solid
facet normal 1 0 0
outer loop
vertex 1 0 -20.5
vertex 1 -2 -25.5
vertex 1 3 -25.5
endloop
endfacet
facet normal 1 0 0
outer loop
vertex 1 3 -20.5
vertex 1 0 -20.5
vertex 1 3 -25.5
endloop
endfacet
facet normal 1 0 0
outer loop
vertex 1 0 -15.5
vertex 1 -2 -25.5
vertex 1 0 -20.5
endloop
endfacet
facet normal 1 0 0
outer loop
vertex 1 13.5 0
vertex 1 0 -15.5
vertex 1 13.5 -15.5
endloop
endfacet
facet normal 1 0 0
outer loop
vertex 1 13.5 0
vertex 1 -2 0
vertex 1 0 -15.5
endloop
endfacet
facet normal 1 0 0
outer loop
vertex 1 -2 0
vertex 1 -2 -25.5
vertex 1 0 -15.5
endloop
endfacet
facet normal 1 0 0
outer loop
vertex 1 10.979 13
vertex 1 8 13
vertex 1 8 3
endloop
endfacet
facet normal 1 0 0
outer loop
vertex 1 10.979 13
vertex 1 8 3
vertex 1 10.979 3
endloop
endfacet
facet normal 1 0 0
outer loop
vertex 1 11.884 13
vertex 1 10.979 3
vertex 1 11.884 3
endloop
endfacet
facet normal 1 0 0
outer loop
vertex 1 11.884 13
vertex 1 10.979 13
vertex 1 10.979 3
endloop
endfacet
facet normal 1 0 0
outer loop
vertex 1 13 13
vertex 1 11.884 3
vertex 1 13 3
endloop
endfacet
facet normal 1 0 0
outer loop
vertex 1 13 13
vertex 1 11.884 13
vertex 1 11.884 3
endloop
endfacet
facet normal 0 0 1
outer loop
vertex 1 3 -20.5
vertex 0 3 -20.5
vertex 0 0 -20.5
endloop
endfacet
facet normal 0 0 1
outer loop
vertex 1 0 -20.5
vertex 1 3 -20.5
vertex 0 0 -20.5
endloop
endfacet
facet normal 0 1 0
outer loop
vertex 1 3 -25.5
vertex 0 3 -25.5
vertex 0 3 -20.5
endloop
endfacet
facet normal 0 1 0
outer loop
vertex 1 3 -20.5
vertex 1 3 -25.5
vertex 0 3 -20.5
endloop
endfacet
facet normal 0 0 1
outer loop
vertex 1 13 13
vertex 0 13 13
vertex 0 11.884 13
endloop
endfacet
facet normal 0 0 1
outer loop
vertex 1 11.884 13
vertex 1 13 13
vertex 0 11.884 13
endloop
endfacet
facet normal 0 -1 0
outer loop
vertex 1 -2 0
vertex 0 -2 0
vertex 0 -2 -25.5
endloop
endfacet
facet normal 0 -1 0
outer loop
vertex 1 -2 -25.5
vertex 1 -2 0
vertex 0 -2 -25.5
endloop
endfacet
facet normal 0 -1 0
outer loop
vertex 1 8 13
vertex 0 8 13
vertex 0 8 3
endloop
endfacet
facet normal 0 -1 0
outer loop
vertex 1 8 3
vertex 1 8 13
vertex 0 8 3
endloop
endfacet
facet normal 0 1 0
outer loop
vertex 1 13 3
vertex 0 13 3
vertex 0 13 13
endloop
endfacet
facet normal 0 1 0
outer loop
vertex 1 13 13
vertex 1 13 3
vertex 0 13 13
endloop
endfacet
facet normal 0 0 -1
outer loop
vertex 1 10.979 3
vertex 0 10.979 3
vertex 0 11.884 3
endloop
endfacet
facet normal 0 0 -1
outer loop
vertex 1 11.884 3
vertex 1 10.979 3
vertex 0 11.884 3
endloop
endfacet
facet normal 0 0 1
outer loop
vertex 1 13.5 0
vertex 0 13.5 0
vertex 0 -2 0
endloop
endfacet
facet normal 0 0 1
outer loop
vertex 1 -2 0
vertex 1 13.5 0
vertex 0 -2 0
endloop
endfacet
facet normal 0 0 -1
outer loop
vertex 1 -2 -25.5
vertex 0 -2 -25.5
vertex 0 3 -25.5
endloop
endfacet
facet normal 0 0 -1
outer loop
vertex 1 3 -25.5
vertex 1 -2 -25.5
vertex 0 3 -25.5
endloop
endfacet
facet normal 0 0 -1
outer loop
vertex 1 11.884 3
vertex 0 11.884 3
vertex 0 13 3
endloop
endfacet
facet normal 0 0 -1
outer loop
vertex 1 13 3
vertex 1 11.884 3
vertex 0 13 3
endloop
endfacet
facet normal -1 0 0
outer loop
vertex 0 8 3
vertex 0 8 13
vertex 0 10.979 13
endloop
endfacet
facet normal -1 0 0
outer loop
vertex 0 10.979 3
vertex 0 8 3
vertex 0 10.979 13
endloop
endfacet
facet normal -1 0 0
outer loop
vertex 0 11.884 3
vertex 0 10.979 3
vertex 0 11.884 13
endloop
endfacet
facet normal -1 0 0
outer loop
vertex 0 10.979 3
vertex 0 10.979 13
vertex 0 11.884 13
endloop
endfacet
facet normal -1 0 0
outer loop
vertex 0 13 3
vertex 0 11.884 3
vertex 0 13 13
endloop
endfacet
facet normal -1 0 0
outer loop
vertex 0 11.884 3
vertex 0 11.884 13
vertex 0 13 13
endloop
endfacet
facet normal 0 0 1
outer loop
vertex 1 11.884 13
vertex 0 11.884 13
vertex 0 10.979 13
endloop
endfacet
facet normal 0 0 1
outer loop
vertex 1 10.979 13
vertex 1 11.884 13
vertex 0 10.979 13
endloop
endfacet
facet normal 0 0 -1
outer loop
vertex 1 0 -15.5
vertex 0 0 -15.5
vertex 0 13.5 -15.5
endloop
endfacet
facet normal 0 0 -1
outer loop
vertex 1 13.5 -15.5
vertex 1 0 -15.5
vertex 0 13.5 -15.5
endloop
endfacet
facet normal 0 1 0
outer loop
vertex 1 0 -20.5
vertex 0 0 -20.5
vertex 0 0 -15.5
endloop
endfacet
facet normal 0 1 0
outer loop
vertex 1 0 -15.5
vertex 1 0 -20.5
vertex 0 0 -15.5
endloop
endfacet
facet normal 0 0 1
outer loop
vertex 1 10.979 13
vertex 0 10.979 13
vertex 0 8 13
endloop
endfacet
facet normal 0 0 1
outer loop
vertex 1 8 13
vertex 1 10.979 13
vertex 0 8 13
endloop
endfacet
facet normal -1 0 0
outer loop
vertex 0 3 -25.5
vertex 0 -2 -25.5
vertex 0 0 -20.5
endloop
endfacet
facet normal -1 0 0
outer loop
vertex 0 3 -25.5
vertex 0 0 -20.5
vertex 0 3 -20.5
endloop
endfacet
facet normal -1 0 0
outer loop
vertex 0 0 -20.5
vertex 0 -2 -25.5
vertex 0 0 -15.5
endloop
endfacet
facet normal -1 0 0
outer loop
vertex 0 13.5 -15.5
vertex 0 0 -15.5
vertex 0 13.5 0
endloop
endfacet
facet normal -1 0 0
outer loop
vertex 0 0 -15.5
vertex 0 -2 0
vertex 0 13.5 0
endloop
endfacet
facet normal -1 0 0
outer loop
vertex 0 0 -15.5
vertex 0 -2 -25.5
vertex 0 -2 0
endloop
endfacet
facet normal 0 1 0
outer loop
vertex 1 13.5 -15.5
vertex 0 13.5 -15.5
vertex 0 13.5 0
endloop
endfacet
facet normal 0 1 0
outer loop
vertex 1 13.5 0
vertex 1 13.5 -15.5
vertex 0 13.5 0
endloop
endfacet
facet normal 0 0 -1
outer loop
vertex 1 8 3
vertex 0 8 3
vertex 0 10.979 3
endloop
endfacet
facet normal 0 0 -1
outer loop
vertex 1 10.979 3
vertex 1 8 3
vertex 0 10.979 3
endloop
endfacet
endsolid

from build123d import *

# Parameters (mm, degrees)
F0_W     = 0.25
F0_H     = 15
F1_DEPTH = 1


# Not quite as in the source:
# - a feature names something its author has since deleted; it is built from what else it names


with BuildPart() as f1:
    # F0 (on Right) → F1 (new body)
    with BuildSketch(Plane.YZ):
        Polygon((11.5, 0), (0, 0), (-1.75, 0), (-1.75, -15), (0, -15), (4.35, -15), (7.15, -15), (11.5, -15), (13.25, -15), (13.25, 0), align=None)
        with Locations((-1.875, -7.5)):
            Rectangle(F0_W, F0_H)
        with Locations((13.375, -7.5)):
            Rectangle(F0_W, F0_H)
        Polygon((0, -15), (-1.75, -15), (-2, -15), (-2, -15.5), (0, -15.5), (13.5, -15.5), (13.5, -15), (13.25, -15), (11.5, -15), (7.15, -15), (4.35, -15), align=None)
        Polygon((0, -15.5), (-2, -15.5), (-2, -25.5), (3, -25.5), (3, -20.5), (0, -20.5), align=None)
    extrude(amount=F1_DEPTH)


with BuildPart() as f1b:
    # F0 (on Right) → F1, piece 2 (new body)
    with BuildSketch(Plane.YZ):
        Polygon((10.9789912227, 13.000000208), (8.0000062163, 13.0000000082), (8.0000066322, 2.9999998385), (10.9789916386, 2.9999997318), (11.3841416386, 2.9999997318), (11.8841416386, 2.9999997318), (13.0000016386, 2.9999997782), (13.0000012227, 13.0000002544), (11.8841412227, 13.000000208), (11.3841412227, 13.000000208), align=None)
    extrude(amount=F1_DEPTH)


solid = Compound([f1.part, f1b.part])
